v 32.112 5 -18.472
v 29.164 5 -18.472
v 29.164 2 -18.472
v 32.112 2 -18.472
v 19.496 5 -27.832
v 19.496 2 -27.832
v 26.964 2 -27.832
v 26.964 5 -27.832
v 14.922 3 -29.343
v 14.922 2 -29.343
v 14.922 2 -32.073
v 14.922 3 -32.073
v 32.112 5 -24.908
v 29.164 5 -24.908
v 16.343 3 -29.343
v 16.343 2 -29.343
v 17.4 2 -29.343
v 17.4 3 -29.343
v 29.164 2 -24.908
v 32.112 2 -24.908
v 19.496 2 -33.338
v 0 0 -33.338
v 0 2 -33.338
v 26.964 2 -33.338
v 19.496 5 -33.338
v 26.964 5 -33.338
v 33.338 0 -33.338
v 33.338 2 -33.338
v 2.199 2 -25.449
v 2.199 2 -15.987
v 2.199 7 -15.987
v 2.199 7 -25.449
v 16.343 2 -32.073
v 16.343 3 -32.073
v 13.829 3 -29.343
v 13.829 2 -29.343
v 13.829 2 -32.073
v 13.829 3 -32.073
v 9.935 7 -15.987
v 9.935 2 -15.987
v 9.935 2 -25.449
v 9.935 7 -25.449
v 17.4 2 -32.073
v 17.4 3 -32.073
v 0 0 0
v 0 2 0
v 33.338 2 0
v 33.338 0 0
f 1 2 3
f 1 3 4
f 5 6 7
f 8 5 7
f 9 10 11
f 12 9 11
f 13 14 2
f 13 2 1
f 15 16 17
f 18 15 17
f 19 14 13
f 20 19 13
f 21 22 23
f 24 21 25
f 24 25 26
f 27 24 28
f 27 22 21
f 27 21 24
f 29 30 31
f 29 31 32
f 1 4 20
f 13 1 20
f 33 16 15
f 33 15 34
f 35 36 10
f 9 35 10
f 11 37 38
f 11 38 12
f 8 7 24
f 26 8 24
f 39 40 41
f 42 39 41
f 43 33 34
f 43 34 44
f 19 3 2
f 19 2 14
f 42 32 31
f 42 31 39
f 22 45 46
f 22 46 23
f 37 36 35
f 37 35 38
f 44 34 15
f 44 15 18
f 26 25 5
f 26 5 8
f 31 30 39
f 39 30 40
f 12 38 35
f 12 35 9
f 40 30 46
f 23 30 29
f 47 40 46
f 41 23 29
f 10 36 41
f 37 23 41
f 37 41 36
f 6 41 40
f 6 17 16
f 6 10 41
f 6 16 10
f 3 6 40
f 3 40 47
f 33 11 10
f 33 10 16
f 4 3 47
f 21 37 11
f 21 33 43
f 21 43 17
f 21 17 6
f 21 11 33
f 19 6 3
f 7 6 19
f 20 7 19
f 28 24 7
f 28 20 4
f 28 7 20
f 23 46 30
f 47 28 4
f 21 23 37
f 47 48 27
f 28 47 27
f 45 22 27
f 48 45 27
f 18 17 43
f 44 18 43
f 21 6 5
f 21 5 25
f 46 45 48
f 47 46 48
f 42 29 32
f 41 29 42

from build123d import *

# Parameters (mm, degrees)
SKETCH1_W           = 33.3375
SKETCH1_H           = 33.3375
BOSS_EXTRUDE1_DEPTH = 2
SKETCH2_W           = 7.736083449
SKETCH2_H           = 9.461345449
BOSS_EXTRUDE2_DEPTH = 5
SKETCH4_W           = 2.947854253
SKETCH4_H           = 6.435986303
BOSS_EXTRUDE3_DEPTH = 3
SKETCH5_W           = 1.093391386
SKETCH5_H           = 2.729545453
SKETCH5_W_2         = 1.056992946
BOSS_EXTRUDE4_DEPTH = 1
SKETCH6_W           = 7.46808346
SKETCH6_H           = 5.505379369
BOSS_EXTRUDE5_DEPTH = 3


with BuildPart() as part:
    # Sketch1 → Boss-Extrude1 (new body)
    with BuildSketch(Plane(origin=(0, 0, 0), x_dir=(1, 0, 0), z_dir=(0, 1, 0))):
        with Locations((16.66875, 16.66875)):
            Rectangle(SKETCH1_W, SKETCH1_H)
    extrude(amount=BOSS_EXTRUDE1_DEPTH)

    # Sketch2 → Boss-Extrude2 (add)
    with BuildSketch(Plane(origin=(0, 2, 0), x_dir=(1, 0, 0), z_dir=(0, 1, 0))):
        with Locations((6.067363874, 20.718036439)):
            Rectangle(SKETCH2_W, SKETCH2_H)
    extrude(amount=BOSS_EXTRUDE2_DEPTH)

    # Sketch4 → Boss-Extrude3 (add)
    with BuildSketch(Plane(origin=(0, 2, 0), x_dir=(1, 0, 0), z_dir=(0, 1, 0))):
        with Locations((30.638118597, 21.689837472)):
            Rectangle(SKETCH4_W, SKETCH4_H)
    extrude(amount=BOSS_EXTRUDE3_DEPTH)

    # Sketch5 → Boss-Extrude4 (add)
    with BuildSketch(Plane(origin=(0, 2, 0), x_dir=(1, 0, 0), z_dir=(0, 1, 0))):
        with Locations((14.375478356, 30.708236471)):
            Rectangle(SKETCH5_W, SKETCH5_H)
        with Locations((16.871379042, 30.708236471)):
            Rectangle(SKETCH5_W_2, SKETCH5_H)
    extrude(amount=BOSS_EXTRUDE4_DEPTH)

    # Sketch6 → Boss-Extrude5 (add)
    with BuildSketch(Plane(origin=(0, 2, 0), x_dir=(1, 0, 0), z_dir=(0, 1, 0))):
        with Locations((23.229569505, 30.584810316)):
            Rectangle(SKETCH6_W, SKETCH6_H)
    extrude(amount=BOSS_EXTRUDE5_DEPTH)


solid = part.part
